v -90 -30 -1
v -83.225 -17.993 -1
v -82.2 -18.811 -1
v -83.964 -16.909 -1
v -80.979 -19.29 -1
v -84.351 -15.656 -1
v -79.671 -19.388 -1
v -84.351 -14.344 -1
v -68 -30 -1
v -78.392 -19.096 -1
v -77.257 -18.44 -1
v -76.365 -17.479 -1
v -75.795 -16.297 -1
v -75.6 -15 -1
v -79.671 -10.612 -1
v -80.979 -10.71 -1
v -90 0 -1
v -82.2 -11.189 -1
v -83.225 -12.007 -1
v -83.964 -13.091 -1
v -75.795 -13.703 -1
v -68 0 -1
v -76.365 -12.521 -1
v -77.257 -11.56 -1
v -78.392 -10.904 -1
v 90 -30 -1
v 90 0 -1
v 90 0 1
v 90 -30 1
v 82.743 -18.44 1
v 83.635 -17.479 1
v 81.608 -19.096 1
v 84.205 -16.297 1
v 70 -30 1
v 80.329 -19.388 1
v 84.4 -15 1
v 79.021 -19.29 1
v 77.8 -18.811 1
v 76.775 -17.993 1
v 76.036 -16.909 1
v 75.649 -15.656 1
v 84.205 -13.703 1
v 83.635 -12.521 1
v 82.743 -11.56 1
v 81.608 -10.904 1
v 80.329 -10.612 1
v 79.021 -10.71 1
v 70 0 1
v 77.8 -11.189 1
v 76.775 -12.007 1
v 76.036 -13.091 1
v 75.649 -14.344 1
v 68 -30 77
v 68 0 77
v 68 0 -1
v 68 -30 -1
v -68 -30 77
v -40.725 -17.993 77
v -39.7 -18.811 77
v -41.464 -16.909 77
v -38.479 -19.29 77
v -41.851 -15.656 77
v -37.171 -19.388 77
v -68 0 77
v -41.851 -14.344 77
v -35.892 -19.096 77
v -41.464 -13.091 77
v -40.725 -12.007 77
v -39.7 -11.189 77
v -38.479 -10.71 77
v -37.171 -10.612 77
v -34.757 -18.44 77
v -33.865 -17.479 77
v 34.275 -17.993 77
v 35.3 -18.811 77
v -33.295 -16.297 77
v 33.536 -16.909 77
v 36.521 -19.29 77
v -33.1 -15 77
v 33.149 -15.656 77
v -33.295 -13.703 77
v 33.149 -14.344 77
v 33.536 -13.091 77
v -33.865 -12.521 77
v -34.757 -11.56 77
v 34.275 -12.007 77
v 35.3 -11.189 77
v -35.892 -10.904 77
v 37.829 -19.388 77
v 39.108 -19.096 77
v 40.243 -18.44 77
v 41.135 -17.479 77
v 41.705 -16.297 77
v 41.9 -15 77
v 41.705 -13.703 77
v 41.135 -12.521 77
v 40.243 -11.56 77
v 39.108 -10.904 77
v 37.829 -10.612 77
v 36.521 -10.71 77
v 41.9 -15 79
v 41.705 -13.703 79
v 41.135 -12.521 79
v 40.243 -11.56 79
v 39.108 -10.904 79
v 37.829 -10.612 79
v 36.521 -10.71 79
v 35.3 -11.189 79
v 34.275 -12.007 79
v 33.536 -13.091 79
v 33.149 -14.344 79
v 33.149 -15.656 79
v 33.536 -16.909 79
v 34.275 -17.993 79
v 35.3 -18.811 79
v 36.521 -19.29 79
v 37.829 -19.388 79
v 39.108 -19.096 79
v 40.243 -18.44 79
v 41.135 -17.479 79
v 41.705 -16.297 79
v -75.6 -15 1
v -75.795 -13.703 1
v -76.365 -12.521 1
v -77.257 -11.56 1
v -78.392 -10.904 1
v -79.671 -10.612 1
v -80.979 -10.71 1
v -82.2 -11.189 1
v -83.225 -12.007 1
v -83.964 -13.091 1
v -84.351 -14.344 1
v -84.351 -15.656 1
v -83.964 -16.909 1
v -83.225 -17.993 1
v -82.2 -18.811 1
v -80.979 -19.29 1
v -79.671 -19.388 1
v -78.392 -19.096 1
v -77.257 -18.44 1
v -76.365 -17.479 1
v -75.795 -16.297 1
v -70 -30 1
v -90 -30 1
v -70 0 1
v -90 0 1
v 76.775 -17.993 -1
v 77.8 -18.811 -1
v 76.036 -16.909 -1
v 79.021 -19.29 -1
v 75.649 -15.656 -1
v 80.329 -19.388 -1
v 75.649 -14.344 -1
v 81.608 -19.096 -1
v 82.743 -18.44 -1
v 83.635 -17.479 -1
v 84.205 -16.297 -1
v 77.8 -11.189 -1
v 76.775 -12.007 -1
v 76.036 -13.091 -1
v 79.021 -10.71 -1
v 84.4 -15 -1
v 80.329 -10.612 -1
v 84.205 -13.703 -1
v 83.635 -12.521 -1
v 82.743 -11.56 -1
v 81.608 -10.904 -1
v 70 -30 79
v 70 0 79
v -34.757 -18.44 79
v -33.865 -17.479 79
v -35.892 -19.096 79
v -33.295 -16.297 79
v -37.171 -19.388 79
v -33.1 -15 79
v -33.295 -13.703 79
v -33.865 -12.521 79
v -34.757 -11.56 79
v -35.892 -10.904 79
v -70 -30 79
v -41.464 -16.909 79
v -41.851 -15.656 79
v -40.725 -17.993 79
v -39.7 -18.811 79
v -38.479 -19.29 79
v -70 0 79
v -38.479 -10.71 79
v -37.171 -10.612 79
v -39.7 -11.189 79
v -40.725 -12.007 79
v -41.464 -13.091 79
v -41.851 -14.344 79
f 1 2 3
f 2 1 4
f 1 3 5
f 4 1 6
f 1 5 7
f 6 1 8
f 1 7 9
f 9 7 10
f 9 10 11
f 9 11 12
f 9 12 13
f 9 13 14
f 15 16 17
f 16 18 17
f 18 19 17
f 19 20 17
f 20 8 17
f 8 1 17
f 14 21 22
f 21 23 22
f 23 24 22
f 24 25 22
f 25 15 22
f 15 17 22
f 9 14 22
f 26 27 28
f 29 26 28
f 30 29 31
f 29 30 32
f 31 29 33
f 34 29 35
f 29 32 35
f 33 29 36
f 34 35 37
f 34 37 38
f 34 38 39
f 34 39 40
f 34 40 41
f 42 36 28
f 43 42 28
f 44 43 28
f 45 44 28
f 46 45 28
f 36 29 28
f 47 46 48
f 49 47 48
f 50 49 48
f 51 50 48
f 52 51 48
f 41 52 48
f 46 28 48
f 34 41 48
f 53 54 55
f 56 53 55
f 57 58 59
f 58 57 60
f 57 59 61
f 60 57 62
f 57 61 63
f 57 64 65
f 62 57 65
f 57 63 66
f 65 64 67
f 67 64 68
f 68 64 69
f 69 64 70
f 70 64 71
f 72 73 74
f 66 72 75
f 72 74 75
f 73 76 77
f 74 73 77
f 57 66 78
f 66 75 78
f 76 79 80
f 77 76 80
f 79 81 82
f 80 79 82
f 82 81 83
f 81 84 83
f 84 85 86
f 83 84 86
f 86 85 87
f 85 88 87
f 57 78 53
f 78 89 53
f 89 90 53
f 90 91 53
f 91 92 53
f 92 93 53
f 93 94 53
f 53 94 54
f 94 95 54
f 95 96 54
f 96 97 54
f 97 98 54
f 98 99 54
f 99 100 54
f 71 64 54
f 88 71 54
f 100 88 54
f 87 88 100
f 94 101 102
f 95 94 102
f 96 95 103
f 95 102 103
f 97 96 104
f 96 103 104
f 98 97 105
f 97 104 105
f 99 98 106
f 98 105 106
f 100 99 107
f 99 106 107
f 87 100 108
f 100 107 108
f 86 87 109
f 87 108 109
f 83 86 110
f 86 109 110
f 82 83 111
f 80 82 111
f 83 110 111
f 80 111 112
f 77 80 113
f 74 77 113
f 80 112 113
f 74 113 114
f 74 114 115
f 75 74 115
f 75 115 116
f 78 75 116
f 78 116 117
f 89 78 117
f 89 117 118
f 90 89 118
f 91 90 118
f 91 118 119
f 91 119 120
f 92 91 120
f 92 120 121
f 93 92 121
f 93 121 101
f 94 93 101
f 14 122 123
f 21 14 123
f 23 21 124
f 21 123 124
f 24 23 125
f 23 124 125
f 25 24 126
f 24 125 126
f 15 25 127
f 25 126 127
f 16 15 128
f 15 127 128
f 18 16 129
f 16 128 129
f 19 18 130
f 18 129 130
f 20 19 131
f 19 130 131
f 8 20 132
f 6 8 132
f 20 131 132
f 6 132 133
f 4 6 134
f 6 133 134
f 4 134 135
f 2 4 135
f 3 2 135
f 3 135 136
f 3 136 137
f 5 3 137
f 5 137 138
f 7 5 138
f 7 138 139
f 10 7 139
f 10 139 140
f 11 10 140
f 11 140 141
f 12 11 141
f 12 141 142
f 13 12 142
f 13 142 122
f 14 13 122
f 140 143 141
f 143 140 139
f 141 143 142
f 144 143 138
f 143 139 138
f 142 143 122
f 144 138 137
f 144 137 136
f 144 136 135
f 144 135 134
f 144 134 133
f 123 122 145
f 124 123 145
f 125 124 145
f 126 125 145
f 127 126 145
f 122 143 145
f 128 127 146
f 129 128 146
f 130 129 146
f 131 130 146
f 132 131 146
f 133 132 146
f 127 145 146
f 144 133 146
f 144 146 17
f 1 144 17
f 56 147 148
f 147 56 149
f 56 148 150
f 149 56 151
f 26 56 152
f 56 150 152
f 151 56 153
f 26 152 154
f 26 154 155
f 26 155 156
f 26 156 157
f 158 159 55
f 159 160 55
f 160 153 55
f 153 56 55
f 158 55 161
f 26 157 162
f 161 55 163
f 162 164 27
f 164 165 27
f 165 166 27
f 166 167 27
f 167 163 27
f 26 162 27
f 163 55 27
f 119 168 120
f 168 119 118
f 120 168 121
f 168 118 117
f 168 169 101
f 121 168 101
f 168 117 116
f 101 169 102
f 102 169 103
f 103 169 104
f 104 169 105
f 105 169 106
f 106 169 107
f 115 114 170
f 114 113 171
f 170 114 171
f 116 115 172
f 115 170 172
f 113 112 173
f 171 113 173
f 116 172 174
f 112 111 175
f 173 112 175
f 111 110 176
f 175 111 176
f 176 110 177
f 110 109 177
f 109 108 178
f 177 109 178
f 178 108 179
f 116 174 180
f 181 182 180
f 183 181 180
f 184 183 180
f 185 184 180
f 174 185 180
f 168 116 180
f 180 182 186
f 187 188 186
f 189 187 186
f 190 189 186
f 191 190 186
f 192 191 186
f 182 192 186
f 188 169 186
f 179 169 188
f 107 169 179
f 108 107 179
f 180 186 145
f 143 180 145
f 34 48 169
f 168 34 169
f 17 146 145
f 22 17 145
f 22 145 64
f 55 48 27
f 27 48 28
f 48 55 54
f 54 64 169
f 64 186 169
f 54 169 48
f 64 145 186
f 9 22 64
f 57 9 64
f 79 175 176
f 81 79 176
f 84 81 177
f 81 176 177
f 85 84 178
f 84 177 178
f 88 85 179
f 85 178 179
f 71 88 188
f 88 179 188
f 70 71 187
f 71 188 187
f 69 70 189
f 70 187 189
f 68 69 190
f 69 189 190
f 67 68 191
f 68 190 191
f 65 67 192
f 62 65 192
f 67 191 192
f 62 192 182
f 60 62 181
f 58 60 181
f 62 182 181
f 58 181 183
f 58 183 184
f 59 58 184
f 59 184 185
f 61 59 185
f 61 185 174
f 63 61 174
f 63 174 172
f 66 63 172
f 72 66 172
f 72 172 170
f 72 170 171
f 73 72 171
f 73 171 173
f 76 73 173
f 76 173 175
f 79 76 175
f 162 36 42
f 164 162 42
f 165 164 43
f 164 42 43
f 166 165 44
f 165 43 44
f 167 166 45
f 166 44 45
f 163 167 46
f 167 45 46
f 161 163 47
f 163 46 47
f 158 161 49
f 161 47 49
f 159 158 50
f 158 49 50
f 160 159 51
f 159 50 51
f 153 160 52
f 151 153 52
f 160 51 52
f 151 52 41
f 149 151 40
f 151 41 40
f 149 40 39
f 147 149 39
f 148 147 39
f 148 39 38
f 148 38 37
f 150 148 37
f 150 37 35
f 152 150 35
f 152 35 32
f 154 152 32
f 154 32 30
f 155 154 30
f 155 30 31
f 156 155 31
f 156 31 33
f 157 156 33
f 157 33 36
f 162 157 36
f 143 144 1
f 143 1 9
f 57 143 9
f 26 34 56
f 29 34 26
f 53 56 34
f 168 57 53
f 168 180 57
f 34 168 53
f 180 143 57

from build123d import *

# Parameters (mm, degrees)
F1_DEPTH = 30
F2_R     = 4.4
F3_R     = 4.4
F4_DEPTH = 25


# Not quite as in the source:
# - a feature names something its author has since deleted; it is built from what else it names


with BuildPart() as f1:
    # F0 (on Front) → F1 (new body)
    with BuildSketch(Plane.XZ):
        Polygon((90, -1), (90, 1), (70, 1), (70, 79), (-70, 79), (-70, 1), (-90, 1), (-90, -1), (-68, -1), (-68, 77), (68, 77), (68, -1), align=None)
    extrude(amount=F1_DEPTH)

    # F2 (on face) + F3 (on face) → F4 (cut)
    with BuildSketch(Plane.XY.offset(1)):
        with Locations((-80, -15)):
            Circle(F2_R)
        with Locations((80, -15)):
            Circle(F2_R)
    with BuildSketch(Plane.XY.offset(79)):
        with Locations((-37.5, -15)):
            Circle(F3_R)
        with Locations((37.5, -15)):
            Circle(F3_R)
    extrude(amount=-F4_DEPTH, mode=Mode.SUBTRACT)


solid = f1.part
